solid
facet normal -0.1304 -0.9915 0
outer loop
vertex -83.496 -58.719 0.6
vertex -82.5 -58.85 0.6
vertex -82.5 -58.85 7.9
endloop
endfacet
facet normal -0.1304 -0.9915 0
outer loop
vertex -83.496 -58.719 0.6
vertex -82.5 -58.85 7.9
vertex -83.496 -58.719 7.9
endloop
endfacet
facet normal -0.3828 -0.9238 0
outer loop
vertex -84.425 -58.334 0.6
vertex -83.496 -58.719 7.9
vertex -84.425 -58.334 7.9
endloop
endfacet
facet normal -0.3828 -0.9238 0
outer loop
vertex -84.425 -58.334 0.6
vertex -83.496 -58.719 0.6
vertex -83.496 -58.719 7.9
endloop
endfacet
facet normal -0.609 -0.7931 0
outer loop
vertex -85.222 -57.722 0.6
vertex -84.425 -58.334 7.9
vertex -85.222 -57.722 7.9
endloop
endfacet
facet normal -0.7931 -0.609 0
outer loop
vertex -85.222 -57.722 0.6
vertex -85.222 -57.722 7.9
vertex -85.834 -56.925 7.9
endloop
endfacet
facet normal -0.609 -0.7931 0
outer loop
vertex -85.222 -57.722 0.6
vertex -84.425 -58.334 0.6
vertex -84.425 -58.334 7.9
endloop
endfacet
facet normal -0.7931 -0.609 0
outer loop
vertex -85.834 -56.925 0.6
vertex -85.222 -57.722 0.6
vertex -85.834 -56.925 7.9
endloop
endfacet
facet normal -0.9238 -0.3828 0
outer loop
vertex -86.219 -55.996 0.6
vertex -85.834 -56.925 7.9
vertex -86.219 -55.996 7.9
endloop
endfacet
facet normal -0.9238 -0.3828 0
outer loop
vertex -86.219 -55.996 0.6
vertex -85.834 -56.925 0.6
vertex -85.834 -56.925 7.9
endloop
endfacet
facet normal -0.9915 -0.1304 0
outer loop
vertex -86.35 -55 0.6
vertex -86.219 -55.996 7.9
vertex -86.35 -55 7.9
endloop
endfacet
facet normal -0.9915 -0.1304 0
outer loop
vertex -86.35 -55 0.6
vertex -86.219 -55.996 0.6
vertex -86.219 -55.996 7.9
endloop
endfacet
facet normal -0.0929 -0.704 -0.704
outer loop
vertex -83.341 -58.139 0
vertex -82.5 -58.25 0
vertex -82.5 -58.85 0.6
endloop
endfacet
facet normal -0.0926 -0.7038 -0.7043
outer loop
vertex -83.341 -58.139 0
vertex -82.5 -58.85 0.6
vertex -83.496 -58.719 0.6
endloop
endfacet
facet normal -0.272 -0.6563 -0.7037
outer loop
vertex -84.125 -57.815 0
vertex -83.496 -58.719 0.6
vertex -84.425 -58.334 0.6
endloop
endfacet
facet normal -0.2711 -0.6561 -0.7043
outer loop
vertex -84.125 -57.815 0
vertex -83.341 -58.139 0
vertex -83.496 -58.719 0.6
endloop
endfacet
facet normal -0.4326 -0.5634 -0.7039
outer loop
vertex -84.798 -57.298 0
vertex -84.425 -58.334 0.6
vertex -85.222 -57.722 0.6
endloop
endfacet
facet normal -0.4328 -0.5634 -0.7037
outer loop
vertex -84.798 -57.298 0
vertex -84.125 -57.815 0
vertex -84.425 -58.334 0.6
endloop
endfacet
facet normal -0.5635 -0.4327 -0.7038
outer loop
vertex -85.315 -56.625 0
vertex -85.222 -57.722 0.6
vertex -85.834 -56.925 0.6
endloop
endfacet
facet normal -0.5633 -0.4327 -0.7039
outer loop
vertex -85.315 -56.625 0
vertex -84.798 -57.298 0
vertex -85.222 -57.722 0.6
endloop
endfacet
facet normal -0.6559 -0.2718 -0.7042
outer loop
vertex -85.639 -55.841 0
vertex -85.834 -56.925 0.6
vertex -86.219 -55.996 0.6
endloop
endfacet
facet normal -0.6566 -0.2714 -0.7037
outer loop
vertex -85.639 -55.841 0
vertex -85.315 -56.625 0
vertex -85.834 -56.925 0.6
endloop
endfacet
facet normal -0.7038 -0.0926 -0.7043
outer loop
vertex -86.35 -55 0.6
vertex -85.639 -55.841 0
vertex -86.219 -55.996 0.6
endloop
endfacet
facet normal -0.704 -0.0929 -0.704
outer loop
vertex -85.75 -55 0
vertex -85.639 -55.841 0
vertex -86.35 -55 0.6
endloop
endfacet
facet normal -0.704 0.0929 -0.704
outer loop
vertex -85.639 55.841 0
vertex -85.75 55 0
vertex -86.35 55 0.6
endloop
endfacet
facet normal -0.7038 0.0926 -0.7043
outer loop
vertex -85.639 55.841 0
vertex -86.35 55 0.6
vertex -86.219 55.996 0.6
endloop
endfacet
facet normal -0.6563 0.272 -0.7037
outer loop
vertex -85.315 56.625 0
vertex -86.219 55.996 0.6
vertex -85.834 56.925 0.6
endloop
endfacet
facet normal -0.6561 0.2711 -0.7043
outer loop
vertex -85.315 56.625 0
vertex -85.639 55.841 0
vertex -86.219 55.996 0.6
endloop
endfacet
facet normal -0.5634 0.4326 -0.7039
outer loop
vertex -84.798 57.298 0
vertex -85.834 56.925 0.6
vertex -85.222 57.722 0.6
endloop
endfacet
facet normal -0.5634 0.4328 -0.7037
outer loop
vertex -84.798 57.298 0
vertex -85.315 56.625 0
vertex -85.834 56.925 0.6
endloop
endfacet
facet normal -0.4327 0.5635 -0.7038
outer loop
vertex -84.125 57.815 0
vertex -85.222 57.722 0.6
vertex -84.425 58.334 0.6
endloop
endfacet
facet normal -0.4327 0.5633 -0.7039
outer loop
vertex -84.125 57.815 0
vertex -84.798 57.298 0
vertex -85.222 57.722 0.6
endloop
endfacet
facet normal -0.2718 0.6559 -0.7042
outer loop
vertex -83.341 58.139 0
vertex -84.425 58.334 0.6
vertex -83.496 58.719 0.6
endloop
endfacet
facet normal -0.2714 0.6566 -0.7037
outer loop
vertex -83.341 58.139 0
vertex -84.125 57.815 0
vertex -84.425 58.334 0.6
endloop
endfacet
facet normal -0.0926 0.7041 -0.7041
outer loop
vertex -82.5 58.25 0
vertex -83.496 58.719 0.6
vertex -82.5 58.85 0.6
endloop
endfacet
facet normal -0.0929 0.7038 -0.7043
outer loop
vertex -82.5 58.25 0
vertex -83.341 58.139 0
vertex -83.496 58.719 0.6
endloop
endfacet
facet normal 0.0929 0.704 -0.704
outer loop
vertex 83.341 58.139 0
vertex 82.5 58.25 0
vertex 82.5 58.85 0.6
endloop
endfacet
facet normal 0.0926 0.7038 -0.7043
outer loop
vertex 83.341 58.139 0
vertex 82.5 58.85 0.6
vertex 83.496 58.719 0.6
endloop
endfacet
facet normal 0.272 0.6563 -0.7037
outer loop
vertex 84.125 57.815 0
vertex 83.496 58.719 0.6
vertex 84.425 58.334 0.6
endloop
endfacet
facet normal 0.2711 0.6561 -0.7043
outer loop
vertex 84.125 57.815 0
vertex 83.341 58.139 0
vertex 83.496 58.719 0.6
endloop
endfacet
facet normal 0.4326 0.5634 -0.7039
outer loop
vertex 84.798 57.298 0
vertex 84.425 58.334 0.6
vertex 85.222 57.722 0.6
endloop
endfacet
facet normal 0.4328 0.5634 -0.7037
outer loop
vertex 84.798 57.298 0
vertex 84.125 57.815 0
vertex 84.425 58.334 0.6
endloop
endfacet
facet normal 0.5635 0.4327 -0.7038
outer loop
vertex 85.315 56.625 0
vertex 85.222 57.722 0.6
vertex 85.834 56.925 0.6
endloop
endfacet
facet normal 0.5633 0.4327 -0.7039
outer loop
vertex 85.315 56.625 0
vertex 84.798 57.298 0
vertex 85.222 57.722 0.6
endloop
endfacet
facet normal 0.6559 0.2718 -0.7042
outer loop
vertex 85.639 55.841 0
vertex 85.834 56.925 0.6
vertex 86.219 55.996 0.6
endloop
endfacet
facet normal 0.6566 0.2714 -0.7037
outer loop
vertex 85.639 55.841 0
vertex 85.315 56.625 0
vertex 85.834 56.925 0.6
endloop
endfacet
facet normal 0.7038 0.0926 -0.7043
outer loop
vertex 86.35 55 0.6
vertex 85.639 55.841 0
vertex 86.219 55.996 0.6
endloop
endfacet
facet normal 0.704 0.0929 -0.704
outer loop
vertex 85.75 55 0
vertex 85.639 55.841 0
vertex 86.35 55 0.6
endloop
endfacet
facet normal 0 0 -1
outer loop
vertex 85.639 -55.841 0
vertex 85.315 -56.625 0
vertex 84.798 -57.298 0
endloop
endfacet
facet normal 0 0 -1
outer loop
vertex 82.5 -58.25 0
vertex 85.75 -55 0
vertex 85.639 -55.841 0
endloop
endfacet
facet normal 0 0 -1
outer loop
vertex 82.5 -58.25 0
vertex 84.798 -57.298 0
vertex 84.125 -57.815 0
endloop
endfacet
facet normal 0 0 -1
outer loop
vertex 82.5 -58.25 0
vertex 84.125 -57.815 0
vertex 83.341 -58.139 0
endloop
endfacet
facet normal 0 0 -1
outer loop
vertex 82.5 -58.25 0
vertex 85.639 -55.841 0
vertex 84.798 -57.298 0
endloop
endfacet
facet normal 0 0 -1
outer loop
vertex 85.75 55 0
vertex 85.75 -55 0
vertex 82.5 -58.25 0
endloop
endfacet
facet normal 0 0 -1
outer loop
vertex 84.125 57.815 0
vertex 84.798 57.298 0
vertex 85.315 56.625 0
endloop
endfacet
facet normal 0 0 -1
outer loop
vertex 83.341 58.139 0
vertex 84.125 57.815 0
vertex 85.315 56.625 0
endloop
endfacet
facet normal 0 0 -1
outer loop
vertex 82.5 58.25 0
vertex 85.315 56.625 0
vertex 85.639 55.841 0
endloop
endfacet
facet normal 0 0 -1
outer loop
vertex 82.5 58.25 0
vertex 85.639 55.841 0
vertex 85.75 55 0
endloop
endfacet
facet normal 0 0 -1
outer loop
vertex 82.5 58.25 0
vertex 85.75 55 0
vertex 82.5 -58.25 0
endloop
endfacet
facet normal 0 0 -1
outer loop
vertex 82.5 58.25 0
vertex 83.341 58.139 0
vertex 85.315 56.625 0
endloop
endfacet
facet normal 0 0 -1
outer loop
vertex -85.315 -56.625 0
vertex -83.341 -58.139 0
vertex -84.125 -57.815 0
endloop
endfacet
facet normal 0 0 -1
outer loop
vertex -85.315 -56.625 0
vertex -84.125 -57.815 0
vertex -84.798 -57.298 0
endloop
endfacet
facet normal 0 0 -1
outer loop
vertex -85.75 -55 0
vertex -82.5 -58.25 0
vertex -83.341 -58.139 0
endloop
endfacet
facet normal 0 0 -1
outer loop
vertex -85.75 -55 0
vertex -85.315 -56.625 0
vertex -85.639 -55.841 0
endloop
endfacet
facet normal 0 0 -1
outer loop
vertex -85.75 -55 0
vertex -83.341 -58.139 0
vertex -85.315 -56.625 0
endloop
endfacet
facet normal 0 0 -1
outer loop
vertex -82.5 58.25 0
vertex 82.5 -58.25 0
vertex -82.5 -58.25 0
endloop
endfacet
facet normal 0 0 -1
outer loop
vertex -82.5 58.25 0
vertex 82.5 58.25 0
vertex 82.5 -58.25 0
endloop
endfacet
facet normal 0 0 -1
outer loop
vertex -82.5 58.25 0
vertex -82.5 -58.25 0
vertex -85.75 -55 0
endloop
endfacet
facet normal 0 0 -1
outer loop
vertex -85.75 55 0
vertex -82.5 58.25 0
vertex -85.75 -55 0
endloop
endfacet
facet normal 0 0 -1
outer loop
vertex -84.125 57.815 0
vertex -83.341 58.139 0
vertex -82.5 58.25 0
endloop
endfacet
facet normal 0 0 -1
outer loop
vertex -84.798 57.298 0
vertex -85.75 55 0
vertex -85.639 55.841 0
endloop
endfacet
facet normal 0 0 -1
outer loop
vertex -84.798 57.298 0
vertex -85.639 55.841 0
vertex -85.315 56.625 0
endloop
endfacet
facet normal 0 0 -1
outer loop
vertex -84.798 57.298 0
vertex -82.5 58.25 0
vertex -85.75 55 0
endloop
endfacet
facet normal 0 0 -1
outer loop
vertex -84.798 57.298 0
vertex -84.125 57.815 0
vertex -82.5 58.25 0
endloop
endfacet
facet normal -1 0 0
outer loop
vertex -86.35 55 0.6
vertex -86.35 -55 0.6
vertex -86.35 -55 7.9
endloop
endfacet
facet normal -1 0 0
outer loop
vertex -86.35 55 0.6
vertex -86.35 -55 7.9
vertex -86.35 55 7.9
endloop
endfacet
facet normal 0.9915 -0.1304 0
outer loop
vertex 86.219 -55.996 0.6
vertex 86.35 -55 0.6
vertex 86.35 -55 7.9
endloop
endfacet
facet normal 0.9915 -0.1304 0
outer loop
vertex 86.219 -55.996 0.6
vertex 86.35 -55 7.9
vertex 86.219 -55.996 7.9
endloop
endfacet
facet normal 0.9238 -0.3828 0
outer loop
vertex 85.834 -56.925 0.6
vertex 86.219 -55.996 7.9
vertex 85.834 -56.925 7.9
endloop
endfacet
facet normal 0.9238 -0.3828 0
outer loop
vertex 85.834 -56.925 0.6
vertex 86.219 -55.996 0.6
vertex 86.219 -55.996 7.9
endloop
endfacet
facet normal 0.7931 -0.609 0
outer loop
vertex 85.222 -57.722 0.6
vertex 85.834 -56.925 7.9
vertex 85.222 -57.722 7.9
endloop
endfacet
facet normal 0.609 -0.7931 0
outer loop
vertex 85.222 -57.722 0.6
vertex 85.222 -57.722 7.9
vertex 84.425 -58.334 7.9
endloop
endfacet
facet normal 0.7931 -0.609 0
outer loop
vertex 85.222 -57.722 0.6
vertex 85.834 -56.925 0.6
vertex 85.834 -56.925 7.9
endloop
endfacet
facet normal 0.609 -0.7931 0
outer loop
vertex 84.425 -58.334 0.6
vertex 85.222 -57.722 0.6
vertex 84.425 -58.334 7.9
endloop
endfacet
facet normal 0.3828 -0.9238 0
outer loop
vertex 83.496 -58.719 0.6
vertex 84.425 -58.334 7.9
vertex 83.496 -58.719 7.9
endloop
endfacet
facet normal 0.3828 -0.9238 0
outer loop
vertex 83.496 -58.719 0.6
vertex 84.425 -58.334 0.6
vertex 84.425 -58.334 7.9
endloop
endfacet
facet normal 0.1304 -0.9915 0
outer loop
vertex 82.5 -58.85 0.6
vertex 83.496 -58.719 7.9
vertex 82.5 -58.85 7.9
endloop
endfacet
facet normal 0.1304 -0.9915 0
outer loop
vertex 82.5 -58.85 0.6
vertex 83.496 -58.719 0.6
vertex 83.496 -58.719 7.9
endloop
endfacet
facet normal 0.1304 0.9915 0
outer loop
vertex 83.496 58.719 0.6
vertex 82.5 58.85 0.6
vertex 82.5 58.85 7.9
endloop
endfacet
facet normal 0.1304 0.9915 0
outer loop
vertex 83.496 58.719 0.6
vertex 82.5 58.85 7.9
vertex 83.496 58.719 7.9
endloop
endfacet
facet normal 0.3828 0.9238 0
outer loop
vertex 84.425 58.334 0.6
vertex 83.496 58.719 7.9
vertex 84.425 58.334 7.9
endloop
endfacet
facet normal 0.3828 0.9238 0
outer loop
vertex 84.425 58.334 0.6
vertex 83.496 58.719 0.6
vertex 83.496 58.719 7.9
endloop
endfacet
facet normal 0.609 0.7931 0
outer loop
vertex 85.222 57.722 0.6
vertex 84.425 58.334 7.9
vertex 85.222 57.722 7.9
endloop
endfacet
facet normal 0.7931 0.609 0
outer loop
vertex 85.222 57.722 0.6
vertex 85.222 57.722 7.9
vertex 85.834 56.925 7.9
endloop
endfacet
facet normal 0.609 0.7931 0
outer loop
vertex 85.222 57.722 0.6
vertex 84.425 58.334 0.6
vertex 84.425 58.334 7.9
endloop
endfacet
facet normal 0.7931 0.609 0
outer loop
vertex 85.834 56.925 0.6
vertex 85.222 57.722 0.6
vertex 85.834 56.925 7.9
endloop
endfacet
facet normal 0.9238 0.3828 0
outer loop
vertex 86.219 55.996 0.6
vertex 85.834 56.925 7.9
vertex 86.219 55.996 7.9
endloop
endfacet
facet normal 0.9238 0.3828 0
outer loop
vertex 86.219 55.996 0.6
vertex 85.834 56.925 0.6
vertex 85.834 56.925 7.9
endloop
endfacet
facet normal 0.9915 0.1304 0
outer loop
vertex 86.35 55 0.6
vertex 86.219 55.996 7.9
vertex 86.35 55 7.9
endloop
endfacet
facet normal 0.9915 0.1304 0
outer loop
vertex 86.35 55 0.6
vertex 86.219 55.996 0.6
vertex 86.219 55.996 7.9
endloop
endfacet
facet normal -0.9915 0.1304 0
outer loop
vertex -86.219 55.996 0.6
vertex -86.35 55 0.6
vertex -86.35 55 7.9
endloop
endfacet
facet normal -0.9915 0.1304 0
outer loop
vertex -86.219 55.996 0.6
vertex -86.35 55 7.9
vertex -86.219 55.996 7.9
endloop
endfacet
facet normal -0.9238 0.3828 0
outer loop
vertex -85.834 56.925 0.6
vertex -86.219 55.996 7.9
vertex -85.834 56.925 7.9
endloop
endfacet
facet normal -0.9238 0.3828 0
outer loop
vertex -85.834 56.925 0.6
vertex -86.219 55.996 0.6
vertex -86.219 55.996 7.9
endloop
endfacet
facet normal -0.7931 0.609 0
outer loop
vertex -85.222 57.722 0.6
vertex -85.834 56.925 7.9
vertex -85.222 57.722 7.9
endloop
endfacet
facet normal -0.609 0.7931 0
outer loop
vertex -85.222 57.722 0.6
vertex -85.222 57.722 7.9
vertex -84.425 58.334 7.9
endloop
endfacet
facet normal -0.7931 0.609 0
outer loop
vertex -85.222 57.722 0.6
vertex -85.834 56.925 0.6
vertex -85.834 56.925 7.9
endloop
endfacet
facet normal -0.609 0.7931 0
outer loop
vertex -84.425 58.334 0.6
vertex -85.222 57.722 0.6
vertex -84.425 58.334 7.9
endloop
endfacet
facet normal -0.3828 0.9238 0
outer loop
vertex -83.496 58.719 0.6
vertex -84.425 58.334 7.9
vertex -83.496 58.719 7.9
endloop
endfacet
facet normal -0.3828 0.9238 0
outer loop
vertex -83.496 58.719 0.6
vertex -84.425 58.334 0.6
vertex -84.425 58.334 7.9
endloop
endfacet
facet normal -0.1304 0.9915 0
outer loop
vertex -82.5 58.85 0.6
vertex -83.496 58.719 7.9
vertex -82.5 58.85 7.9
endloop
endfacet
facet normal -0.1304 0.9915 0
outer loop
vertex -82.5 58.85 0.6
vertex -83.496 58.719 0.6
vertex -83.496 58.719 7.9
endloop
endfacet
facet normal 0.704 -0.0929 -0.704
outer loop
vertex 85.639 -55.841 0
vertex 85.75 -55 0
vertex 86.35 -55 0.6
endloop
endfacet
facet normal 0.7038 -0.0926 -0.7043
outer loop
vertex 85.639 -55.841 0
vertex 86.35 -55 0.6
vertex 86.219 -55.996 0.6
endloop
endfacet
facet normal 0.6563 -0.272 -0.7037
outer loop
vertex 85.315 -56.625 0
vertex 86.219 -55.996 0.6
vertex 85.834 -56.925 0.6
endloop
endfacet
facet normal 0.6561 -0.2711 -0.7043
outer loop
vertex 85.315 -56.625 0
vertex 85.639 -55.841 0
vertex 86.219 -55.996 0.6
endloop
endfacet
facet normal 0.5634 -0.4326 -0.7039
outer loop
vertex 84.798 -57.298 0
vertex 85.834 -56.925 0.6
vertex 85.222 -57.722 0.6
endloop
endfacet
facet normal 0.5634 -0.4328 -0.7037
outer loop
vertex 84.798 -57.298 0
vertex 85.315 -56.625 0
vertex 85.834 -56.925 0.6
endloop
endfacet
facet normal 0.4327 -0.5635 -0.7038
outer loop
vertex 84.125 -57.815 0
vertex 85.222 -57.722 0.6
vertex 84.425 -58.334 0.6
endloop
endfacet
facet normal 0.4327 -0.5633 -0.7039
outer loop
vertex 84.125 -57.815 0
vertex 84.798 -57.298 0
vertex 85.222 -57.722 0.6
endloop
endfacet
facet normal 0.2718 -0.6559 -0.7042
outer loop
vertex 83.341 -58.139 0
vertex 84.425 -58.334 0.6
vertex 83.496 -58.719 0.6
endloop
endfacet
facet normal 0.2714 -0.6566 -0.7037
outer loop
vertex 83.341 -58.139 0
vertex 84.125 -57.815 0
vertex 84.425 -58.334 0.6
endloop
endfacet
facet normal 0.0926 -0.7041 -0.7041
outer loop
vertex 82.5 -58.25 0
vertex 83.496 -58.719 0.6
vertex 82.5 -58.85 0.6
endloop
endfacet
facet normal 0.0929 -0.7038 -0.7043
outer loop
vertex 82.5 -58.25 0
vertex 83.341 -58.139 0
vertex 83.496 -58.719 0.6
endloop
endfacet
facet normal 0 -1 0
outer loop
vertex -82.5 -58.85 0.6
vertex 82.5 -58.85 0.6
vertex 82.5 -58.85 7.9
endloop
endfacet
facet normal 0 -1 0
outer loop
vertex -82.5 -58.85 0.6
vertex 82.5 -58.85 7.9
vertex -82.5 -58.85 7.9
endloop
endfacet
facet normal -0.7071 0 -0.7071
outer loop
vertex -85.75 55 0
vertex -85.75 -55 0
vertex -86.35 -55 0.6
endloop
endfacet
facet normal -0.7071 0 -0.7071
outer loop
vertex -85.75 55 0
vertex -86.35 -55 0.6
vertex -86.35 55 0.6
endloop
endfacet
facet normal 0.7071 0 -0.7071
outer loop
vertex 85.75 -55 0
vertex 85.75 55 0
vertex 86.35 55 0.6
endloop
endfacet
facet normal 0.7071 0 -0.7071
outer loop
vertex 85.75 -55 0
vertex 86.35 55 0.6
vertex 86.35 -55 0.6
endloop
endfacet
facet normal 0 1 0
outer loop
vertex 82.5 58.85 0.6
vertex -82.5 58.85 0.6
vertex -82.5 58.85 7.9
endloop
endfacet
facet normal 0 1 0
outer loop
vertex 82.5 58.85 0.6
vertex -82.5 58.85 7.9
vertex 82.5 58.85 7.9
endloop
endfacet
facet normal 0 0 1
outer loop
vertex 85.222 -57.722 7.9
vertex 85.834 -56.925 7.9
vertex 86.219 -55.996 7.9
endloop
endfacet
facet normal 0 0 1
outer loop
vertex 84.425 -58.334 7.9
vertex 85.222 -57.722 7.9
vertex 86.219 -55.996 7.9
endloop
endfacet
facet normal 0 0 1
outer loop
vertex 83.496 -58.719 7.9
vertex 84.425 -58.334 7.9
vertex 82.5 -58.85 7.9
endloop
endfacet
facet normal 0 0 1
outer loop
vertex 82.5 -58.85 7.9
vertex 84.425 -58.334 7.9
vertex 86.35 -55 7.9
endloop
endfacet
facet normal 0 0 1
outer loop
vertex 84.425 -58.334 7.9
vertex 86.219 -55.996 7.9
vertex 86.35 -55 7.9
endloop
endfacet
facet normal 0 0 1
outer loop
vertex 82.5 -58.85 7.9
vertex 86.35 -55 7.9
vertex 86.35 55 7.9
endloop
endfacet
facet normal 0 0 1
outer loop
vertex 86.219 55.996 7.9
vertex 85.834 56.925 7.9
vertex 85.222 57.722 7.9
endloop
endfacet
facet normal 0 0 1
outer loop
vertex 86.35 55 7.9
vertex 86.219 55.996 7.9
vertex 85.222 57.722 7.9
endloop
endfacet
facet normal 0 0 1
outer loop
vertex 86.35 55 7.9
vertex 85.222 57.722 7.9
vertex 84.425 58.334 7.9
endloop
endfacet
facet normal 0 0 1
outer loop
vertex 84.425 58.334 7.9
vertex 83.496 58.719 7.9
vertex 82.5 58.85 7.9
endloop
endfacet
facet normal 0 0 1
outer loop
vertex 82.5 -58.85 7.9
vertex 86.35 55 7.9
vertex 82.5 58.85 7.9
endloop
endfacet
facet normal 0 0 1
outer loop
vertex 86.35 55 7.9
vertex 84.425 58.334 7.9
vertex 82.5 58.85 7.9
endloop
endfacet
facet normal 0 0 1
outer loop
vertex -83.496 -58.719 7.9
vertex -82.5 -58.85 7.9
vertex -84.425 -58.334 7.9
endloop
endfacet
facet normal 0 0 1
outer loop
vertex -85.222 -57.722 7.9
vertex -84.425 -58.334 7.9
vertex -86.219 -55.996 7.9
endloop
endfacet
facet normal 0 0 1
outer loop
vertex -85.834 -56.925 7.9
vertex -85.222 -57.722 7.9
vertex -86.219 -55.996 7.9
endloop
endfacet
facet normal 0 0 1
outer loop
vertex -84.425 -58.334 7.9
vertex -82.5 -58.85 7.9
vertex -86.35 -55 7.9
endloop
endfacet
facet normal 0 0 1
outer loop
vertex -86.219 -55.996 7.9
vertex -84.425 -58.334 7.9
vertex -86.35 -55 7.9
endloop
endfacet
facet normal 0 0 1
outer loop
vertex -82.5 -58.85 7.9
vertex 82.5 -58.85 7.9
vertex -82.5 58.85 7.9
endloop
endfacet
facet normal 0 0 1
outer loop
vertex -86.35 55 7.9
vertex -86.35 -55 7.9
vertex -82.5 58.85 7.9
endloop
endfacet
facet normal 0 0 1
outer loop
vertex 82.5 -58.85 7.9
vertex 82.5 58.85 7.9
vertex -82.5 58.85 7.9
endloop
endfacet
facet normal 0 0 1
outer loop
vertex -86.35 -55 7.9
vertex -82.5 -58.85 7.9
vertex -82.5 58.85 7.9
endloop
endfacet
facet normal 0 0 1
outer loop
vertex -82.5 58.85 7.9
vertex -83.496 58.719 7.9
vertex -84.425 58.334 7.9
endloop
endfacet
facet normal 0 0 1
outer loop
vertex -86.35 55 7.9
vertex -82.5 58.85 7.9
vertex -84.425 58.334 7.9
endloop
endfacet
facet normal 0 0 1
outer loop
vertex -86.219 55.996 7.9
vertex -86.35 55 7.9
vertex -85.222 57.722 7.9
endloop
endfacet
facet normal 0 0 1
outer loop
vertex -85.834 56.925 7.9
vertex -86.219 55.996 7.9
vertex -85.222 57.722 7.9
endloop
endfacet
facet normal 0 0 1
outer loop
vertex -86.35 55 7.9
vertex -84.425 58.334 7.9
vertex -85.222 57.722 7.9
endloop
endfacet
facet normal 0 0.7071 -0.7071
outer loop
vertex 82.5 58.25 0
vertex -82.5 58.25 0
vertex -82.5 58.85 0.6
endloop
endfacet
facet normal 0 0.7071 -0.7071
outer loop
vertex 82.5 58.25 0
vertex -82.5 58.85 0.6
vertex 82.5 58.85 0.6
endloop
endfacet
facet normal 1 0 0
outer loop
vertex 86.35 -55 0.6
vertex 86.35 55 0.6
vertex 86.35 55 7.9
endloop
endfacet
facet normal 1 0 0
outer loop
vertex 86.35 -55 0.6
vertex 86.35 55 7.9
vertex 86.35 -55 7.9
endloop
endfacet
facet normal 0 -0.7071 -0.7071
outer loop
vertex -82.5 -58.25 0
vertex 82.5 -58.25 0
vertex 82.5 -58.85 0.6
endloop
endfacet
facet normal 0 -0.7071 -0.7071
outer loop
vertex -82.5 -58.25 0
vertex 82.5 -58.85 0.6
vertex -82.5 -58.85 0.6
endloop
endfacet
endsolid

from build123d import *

# Parameters (mm, degrees)
BOSS_EXTRUDE1_DEPTH = 7.9
CHAMFER1_SIZE       = 0.6


with BuildPart() as part:
    # Sketch1 → Boss-Extrude1 (new body)
    with BuildSketch(Plane.XY):
        with BuildLine():
            Line((-82.5, 58.85), (82.5, 58.85))
            ThreePointArc((82.5, 58.85), (85.222361108, 57.722361108), (86.35, 55))
            Line((86.35, 55), (86.35, -55))
            ThreePointArc((86.35, -55), (85.222361108, -57.722361108), (82.5, -58.85))
            Line((82.5, -58.85), (-82.5, -58.85))
            ThreePointArc((-82.5, -58.85), (-85.222361108, -57.722361108), (-86.35, -55))
            Line((-86.35, -55), (-86.35, 55))
            ThreePointArc((-86.35, 55), (-85.222361108, 57.722361108), (-82.5, 58.85))
        make_face()
    extrude(amount=BOSS_EXTRUDE1_DEPTH)

    # Chamfer1
    chamfer1_edges = [part.edges().sort_by_distance(p)[0] for p in [
        (-86.35, 0, 0),
        (-85.222361108, -57.722361108, 0),
        (0, -58.85, 0),
        (85.222361108, -57.722361108, 0),
        (86.35, 0, 0),
        (85.222361108, 57.722361108, 0),
        (0, 58.85, 0),
        (-85.222361108, 57.722361108, 0),
    ]]
    chamfer(chamfer1_edges, length=CHAMFER1_SIZE)


solid = part.part
